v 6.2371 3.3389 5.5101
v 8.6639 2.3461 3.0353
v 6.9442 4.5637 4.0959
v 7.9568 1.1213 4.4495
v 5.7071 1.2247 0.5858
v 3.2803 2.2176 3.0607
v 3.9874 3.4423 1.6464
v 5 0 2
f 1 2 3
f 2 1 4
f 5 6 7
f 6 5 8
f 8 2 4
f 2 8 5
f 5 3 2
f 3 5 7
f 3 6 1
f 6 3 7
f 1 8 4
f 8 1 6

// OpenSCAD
// translate and rotate around the three axes
translate([5, 0, 2]) rotate([30, 45, 60]) cube([2, 3, 4]);
